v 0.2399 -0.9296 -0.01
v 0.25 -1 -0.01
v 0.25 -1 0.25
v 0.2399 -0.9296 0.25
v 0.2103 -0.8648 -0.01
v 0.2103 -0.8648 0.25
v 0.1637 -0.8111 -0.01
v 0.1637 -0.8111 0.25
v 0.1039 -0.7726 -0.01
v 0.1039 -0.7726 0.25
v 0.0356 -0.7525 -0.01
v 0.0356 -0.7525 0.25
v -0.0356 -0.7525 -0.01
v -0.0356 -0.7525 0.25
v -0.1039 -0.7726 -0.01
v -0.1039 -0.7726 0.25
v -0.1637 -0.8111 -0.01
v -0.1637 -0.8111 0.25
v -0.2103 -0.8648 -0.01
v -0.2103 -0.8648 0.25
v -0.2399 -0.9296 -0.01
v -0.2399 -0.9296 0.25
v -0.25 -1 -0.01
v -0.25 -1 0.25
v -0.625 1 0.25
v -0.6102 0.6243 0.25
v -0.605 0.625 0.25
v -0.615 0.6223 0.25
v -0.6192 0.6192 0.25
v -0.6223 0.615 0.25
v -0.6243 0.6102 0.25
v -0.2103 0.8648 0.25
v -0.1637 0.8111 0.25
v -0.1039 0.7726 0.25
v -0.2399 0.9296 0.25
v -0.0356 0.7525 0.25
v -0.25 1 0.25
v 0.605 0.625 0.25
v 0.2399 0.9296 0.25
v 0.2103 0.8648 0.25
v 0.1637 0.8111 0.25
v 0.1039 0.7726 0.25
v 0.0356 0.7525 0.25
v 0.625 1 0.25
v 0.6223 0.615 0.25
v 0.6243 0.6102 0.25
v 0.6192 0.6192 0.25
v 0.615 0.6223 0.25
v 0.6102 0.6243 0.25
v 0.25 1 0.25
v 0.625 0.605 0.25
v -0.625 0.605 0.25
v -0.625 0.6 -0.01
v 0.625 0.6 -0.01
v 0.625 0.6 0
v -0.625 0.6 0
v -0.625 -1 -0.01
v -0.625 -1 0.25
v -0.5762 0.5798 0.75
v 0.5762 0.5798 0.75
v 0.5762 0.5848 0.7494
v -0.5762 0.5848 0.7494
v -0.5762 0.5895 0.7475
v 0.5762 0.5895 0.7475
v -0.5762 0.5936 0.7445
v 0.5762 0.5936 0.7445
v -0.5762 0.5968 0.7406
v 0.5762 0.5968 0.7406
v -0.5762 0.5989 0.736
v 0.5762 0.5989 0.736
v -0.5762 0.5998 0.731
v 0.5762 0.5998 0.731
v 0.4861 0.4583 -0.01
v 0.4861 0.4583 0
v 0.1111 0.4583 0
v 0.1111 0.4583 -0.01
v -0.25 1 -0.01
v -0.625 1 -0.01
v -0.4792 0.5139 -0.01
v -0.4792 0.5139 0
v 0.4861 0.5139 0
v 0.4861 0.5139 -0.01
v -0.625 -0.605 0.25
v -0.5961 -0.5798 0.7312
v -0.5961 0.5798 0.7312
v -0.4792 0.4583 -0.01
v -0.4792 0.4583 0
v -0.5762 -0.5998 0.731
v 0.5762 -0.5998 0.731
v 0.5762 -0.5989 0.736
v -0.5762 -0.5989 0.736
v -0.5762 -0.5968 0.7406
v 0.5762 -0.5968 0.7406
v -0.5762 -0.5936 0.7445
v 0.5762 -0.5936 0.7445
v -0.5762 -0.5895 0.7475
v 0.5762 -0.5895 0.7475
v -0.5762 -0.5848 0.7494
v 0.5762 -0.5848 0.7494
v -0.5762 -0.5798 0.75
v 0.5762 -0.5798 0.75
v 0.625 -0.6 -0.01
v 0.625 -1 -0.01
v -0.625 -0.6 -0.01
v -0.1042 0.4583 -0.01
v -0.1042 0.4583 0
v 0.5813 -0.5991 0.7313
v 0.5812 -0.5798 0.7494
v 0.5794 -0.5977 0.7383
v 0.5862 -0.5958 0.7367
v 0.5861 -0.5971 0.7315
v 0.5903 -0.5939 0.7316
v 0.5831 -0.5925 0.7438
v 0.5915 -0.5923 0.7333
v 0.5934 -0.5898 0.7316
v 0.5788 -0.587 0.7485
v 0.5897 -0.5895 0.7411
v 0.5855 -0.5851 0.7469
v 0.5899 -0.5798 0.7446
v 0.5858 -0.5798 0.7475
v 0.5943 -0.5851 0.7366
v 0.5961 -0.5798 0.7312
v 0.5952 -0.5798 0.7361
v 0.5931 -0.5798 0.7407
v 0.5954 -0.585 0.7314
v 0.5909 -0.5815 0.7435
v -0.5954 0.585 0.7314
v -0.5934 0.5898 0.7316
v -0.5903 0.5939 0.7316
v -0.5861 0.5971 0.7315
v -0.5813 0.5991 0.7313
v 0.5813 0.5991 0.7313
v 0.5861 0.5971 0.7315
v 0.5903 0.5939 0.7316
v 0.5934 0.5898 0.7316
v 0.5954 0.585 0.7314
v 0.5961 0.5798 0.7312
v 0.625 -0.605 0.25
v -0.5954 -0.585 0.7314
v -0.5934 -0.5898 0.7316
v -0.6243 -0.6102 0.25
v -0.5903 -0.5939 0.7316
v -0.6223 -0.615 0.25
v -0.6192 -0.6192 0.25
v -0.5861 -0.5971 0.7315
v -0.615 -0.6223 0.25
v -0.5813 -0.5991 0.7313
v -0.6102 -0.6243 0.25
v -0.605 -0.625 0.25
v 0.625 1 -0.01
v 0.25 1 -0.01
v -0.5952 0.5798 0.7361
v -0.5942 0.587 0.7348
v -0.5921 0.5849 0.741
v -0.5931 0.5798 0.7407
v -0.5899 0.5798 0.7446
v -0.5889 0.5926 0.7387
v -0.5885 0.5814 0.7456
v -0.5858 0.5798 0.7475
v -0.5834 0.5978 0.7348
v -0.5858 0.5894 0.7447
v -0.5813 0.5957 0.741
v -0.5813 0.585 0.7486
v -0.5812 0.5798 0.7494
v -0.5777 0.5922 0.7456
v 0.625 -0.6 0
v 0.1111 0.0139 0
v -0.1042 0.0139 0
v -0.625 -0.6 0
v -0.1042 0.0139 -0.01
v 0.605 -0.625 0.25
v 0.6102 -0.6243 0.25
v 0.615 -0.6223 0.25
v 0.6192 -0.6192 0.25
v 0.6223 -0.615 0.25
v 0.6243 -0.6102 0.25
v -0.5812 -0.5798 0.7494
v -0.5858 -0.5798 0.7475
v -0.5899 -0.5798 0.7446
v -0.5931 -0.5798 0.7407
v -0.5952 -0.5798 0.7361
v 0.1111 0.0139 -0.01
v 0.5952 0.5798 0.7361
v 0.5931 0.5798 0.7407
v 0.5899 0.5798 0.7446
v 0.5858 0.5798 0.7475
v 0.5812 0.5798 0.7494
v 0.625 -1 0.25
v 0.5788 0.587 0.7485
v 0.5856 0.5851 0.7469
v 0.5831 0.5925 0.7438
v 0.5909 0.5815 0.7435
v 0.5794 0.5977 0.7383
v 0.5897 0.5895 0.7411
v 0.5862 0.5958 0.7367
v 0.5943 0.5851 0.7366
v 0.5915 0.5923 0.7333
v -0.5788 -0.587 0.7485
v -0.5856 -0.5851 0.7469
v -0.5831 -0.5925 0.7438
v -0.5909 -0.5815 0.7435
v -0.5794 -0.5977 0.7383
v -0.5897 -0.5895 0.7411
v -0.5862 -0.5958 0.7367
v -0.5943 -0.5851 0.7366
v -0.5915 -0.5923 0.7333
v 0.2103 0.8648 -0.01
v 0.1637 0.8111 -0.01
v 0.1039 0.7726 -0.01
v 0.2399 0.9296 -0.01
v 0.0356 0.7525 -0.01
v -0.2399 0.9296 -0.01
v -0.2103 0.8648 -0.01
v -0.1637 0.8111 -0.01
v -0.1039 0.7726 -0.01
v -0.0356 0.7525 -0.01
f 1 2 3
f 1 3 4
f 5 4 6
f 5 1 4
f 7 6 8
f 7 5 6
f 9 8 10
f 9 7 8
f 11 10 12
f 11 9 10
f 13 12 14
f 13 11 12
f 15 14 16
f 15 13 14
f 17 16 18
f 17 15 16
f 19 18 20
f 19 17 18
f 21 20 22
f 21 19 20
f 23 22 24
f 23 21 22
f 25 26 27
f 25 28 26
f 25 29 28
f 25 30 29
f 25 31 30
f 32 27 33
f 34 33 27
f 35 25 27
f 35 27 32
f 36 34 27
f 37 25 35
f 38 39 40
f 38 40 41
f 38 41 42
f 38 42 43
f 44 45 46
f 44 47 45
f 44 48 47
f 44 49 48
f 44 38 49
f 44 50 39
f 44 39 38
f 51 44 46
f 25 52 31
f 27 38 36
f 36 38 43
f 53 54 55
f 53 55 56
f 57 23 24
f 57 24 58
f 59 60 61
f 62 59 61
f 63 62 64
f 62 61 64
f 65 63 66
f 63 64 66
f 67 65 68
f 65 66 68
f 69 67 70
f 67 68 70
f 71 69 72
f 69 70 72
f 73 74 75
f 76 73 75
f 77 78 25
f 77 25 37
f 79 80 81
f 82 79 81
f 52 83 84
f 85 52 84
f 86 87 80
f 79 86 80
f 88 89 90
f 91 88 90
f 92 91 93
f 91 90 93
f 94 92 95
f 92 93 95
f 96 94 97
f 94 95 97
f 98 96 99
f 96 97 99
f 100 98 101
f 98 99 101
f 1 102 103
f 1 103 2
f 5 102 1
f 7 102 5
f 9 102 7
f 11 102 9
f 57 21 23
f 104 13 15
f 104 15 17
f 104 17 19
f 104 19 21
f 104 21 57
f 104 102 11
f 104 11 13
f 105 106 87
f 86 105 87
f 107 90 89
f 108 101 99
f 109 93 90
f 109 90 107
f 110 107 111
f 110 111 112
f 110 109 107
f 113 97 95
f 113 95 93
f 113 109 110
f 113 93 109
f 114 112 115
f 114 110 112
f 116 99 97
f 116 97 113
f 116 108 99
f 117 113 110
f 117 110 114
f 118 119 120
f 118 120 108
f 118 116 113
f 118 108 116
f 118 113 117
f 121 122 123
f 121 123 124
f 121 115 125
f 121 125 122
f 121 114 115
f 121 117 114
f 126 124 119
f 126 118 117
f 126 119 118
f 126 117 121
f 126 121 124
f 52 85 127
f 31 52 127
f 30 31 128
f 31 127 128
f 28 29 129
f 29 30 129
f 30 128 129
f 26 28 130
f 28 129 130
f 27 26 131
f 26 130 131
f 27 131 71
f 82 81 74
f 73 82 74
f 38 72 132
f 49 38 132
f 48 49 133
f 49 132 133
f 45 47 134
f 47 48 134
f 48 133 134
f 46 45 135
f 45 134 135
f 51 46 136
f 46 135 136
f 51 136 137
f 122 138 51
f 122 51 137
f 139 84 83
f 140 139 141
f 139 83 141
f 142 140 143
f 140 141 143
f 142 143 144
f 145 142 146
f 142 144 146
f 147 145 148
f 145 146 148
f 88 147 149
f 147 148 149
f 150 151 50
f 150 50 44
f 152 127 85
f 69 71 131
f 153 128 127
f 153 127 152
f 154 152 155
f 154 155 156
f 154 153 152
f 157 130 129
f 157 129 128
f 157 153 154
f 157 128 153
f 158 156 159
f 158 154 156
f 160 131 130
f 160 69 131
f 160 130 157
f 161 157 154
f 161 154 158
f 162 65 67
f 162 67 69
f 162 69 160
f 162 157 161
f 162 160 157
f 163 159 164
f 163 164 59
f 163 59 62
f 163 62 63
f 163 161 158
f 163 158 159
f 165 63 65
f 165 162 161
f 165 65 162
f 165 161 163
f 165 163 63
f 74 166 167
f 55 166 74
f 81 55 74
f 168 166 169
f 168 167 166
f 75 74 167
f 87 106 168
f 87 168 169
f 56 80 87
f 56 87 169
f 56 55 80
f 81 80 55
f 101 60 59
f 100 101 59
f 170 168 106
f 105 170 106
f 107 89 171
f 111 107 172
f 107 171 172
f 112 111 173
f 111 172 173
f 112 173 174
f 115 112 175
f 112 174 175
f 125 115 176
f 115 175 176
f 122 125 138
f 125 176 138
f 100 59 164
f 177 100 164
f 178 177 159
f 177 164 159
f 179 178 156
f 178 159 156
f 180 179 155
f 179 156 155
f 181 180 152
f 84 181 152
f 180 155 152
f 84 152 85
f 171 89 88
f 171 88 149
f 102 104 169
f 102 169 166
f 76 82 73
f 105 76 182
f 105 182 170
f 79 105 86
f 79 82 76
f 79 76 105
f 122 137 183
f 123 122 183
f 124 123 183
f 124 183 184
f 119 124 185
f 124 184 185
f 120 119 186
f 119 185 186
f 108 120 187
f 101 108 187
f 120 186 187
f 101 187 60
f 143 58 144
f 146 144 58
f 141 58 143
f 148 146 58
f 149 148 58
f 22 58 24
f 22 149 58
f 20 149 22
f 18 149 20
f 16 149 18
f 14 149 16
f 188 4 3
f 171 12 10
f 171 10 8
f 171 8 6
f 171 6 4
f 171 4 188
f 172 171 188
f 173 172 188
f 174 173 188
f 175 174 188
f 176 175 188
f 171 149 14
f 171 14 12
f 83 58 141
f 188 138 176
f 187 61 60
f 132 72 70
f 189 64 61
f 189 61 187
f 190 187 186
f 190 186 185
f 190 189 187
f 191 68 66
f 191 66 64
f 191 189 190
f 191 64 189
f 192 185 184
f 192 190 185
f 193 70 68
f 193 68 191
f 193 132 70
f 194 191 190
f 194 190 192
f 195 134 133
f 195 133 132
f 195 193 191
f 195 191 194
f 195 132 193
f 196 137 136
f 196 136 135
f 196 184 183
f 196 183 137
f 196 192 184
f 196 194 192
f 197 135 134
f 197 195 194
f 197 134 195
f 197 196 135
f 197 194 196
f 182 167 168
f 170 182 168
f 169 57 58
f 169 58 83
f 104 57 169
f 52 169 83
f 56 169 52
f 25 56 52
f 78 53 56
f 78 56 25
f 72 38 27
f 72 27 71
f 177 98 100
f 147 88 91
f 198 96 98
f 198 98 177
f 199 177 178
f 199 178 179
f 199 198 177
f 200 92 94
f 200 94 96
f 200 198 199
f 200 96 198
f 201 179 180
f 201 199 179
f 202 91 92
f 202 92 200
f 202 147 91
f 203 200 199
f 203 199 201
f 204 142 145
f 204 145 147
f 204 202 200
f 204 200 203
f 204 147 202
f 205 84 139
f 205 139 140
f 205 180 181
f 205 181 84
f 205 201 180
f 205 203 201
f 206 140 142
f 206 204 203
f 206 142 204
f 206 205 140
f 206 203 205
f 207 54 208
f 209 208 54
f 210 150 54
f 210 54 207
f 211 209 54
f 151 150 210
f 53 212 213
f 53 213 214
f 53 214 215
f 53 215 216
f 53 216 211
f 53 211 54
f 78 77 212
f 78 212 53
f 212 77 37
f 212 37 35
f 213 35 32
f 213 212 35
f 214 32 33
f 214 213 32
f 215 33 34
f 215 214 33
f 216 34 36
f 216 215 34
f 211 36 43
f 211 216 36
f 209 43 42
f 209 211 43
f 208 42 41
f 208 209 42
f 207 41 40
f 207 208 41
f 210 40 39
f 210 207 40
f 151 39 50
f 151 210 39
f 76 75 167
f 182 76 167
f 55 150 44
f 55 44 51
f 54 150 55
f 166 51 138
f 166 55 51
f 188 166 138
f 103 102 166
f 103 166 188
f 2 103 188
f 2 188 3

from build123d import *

# Parameters (mm, degrees)
EXTRUDE_1_DEPTH     = 0.75
CUT_EXTRUDE_1_REACH = 3.768
SKETCH_2_W          = 0.5
SKETCH_2_H          = 0.375
EXTRUDE_START       = 0.01
EXTRUDE_2_DEPTH     = 0.01
WRAP_1_DEPTH        = 0.01
CUT_EXTRUDE_2_REACH = 3.896
CHAMFER_1_SIZE      = 0.5
CHAMFER_1_SIZE_2    = 0.02620389
CHAMFER_2_SIZE      = 0.02620389
CHAMFER_2_SIZE_2    = 0.5
FILLET_1_R          = 0.02


with BuildPart() as part:
    # 草图1 → 凸台-拉伸1 (new body)
    with BuildSketch(Plane.XY):
        with BuildLine():
            Line((-0.625, 1), (-0.25, 1))
            ThreePointArc((-0.25, 1), (0, 0.75), (0.25, 1))
            Line((0.25, 1), (0.625, 1))
            Line((0.625, 1), (0.625, -1))
            Line((0.625, -1), (0.25, -1))
            ThreePointArc((0.25, -1), (0, -0.75), (-0.25, -1))
            Line((-0.25, -1), (-0.625, -1))
            Line((-0.625, -1), (-0.625, 1))
        make_face()
    extrude(amount=EXTRUDE_1_DEPTH)

    # 草图2 → 切除-拉伸1 (cut, up to next)
    with BuildSketch(Plane(origin=(0.625, 0, 0), x_dir=(0, 0, -1), z_dir=(1, 0, 0)), mode=Mode.PRIVATE) as cut_extrude_1_sk1:
        with Locations((-0.5, 0.8125)):
            Rectangle(SKETCH_2_W, SKETCH_2_H)
    cut_extrude_1_tool1 = extrude(cut_extrude_1_sk1.sketch, amount=-CUT_EXTRUDE_1_REACH, mode=Mode.PRIVATE) & part.part
    # 草图2 → 切除-拉伸1 (cut, up to next)
    with BuildSketch(Plane(origin=(0.625, 0, 0), x_dir=(0, 0, -1), z_dir=(1, 0, 0)), mode=Mode.PRIVATE) as cut_extrude_1_sk2:
        with Locations((-0.5, -0.8125)):
            Rectangle(SKETCH_2_W, SKETCH_2_H)
    cut_extrude_1_tool2 = extrude(cut_extrude_1_sk2.sketch, amount=-CUT_EXTRUDE_1_REACH, mode=Mode.PRIVATE) & part.part
    add(cut_extrude_1_tool1.solids().sort_by_distance((0.625, 0.8125, 0.5))[0], mode=Mode.SUBTRACT)
    add(cut_extrude_1_tool2.solids().sort_by_distance((0.625, -0.8125, 0.5))[0], mode=Mode.SUBTRACT)

    # 草图3 → 凸台-拉伸2 (add)
    with BuildSketch(Plane(origin=(0, 0, 0), x_dir=(-1, 0, 0), z_dir=(0, 0, -1)).offset(EXTRUDE_START)):
        with BuildLine():
            Line((-0.625, 1), (-0.625, 0.6))
            Line((-0.625, 0.6), (0.625, 0.6))
            Line((0.625, 0.6), (0.625, 1))
            Line((0.625, 1), (0.25, 1))
            ThreePointArc((0.25, 1), (0, 0.75), (-0.25, 1))
            Line((-0.25, 1), (-0.625, 1))
        make_face()
        with BuildLine():
            Line((0.625, -0.6), (-0.625, -0.6))
            Line((-0.625, -0.6), (-0.625, -1))
            Line((-0.625, -1), (-0.25, -1))
            ThreePointArc((-0.25, -1), (0, -0.75), (0.25, -1))
            Line((0.25, -1), (0.625, -1))
            Line((0.625, -1), (0.625, -0.6))
        make_face()
    extrude(amount=-EXTRUDE_2_DEPTH)

    # 包覆1: read off the stored shape, not the designer's step
    # 包覆1 outline → 包覆1 (add)
    with BuildSketch(Plane(origin=(0, 0, 0), x_dir=(-1, 0, 0), z_dir=(0, 0, -1))):
        Polygon((0.104166667, 0.013888889), (0.104166667, 0.458333333), (0.479166667, 0.458333333), (0.479166667, 0.513888889), (-0.486111111, 0.513888889), (-0.486111111, 0.458333333), (-0.111111111, 0.458333333), (-0.111111111, 0.013888889), align=None)
    extrude(amount=WRAP_1_DEPTH)

    # 草图7 → 切除-拉伸2 (cut, up to next)
    with BuildSketch(Plane(origin=(0, 0.625, 0), x_dir=(1, 0, 0), z_dir=(0, 1, 0)), mode=Mode.PRIVATE) as cut_extrude_2_sk1:
        Polygon((-0.625, -0.25), (-0.595016124, -0.75), (-0.625, -0.75), align=None)
    cut_extrude_2_tool1 = extrude(cut_extrude_2_sk1.sketch, amount=-CUT_EXTRUDE_2_REACH, mode=Mode.PRIVATE) & part.part
    # 草图7 → 切除-拉伸2 (cut, up to next)
    with BuildSketch(Plane(origin=(0, 0.625, 0), x_dir=(1, 0, 0), z_dir=(0, 1, 0)), mode=Mode.PRIVATE) as cut_extrude_2_sk2:
        Polygon((0.595016124, -0.75), (0.625, -0.75), (0.625, -0.25), align=None)
    cut_extrude_2_tool2 = extrude(cut_extrude_2_sk2.sketch, amount=-CUT_EXTRUDE_2_REACH, mode=Mode.PRIVATE) & part.part
    add(cut_extrude_2_tool1.solids().sort_by_distance((-0.615005, 0.625, 0.583333))[0], mode=Mode.SUBTRACT)
    add(cut_extrude_2_tool2.solids().sort_by_distance((0.615005, 0.625, 0.583333))[0], mode=Mode.SUBTRACT)

    # 倒角1
    # the kernel refuses this chamfer: 0.5, 0.02620389 mm, written as the material it takes off along each edge
    with BuildSketch(Plane(origin=(1.894950234, 0.625, 0.75), x_dir=(0, 0, -1), z_dir=(-1, 0, 0))) as chamfer_1_piece_1_section:
        Polygon((CHAMFER_1_SIZE, 0), (0, CHAMFER_1_SIZE_2 * 0.99999998632), (0, 0), align=None)
    chamfer_1_piece_1 = extrude(amount=3.789900469, mode=Mode.PRIVATE)
    chamfer_1_piece_1 = split(chamfer_1_piece_1, bisect_by=Plane(origin=(1.894950234, 0.625, 0.25), z_dir=(0, 0, 1)), keep=Keep.TOP, mode=Mode.PRIVATE)
    add(chamfer_1_piece_1, mode=Mode.SUBTRACT)

    # 倒角2
    # the kernel refuses this chamfer: 0.5, 0.02620389 mm, written as the material it takes off along each edge
    with BuildSketch(Plane(origin=(1.894950234, -0.625, 0.75), x_dir=(0, 1, 0), z_dir=(-1, 0, 0))) as chamfer_2_piece_1_section:
        Polygon((CHAMFER_2_SIZE * 0.99999998632, 0), (0, CHAMFER_2_SIZE_2), (0, 0), align=None)
    chamfer_2_piece_1 = extrude(amount=3.789900469, mode=Mode.PRIVATE)
    chamfer_2_piece_1 = split(chamfer_2_piece_1, bisect_by=Plane(origin=(1.894950234, -0.625, 0.25), z_dir=(0, 0, 1)), keep=Keep.TOP, mode=Mode.PRIVATE)
    add(chamfer_2_piece_1, mode=Mode.SUBTRACT)

    # 圆角1
    # the kernel refuses this fillet: 0.02 mm, written as the material it takes off along each edge
    with BuildSketch(Plane(origin=(0.57617955, 0.579816819, 0.73), x_dir=(0.04124395278448508, 0.7247571544349799, -0.6877688590318859), z_dir=(0.5553605365793874, 0.5555957455592435, 0.618779477622459))) as fillet_1_piece_1_section:
        Polygon((-0.040070478, -0.040070478), (0.040070478, -0.040070478), (0.040070478, 0.040070478), (-0.040070478, 0.040070478), align=None)
    fillet_1_piece_1 = extrude(amount=0.040070478, mode=Mode.PRIVATE)
    fillet_1_piece_1 = split(fillet_1_piece_1, bisect_by=Plane(origin=(0.57617955, 0.579816819, 0.73), z_dir=(0, 1, 0)), keep=Keep.TOP, mode=Mode.PRIVATE)
    fillet_1_piece_1 = split(fillet_1_piece_1, bisect_by=Plane(origin=(0.57617955, 0.579816819, 0.73), z_dir=(1, 0, 0)), keep=Keep.TOP, mode=Mode.PRIVATE)
    fillet_1_piece_1 = split(fillet_1_piece_1, bisect_by=Plane(origin=(0.57617955, 0.579816819, 0.73), z_dir=(-0.05977847359904646, -0.052242362176689705, 0.9968436535828312)), keep=Keep.TOP, mode=Mode.PRIVATE)
    fillet_1_piece_1 = split(fillet_1_piece_1, bisect_by=Plane(origin=(0.596143685, 0.579816819, 0.731197204), z_dir=(-0.9982067693968444, 0, -0.0598602165909465)), keep=Keep.TOP, mode=Mode.PRIVATE)
    fillet_1_piece_1 = split(fillet_1_piece_1, bisect_by=Plane(origin=(0.57617955, 0.579816819, 0.75), z_dir=(0, 0, -1)), keep=Keep.TOP, mode=Mode.PRIVATE)
    fillet_1_piece_1 = split(fillet_1_piece_1, bisect_by=Plane(origin=(0.57617955, 0.59978941, 0.731046719), z_dir=(0, -0.9986295347545728, -0.05233595624296412)), keep=Keep.TOP, mode=Mode.PRIVATE)
    fillet_1_piece_1 = fillet_1_piece_1 - Plane(origin=(0.57617955, 0.579816819, 0.73), x_dir=(-0.5553605365793874, -0.5555957455592435, -0.618779477622459), z_dir=(0.04124395278448508, 0.7247571544349799, -0.6877688590318859)) * Sphere(FILLET_1_R, mode=Mode.PRIVATE)
    add(fillet_1_piece_1, mode=Mode.SUBTRACT)
    with BuildSketch(Plane(origin=(-0.57617955, 0.579816819, 0.73), x_dir=(0.7072564722746582, 0.7069570584028463, 0), z_dir=(-0.5553605365793893, 0.5555957455592451, 0.6187794776224558))) as fillet_1_piece_2_section:
        Polygon((-0.040070478, -0.040070478), (0.040070478, -0.040070478), (0.040070478, 0.040070478), (-0.040070478, 0.040070478), align=None)
    fillet_1_piece_2 = extrude(amount=0.040070478, mode=Mode.PRIVATE)
    fillet_1_piece_2 = split(fillet_1_piece_2, bisect_by=Plane(origin=(-0.57617955, 0.579816819, 0.73), z_dir=(-1, 0, 0)), keep=Keep.TOP, mode=Mode.PRIVATE)
    fillet_1_piece_2 = split(fillet_1_piece_2, bisect_by=Plane(origin=(-0.57617955, 0.579816819, 0.73), z_dir=(0.0597784735990376, -0.05224236217668974, 0.9968436535828318)), keep=Keep.TOP, mode=Mode.PRIVATE)
    fillet_1_piece_2 = split(fillet_1_piece_2, bisect_by=Plane(origin=(-0.57617955, 0.579816819, 0.73), z_dir=(0, 1, 0)), keep=Keep.TOP, mode=Mode.PRIVATE)
    fillet_1_piece_2 = split(fillet_1_piece_2, bisect_by=Plane(origin=(-0.57617955, 0.579816819, 0.75), z_dir=(0, 0, -1)), keep=Keep.TOP, mode=Mode.PRIVATE)
    fillet_1_piece_2 = split(fillet_1_piece_2, bisect_by=Plane(origin=(-0.57617955, 0.59978941, 0.731046719), z_dir=(0, -0.9986295347545728, -0.05233595624296412)), keep=Keep.TOP, mode=Mode.PRIVATE)
    fillet_1_piece_2 = split(fillet_1_piece_2, bisect_by=Plane(origin=(-0.596143685, 0.579816819, 0.731197204), z_dir=(0.998206769396845, 0, -0.05986021659093763)), keep=Keep.TOP, mode=Mode.PRIVATE)
    fillet_1_piece_2 = fillet_1_piece_2 - Plane(origin=(-0.57617955, 0.579816819, 0.73), x_dir=(0.5553605365793893, -0.5555957455592451, -0.6187794776224558), z_dir=(0.7072564722746582, 0.7069570584028463, 0)) * Sphere(FILLET_1_R, mode=Mode.PRIVATE)
    add(fillet_1_piece_2, mode=Mode.SUBTRACT)
    with BuildSketch(Plane(origin=(0.57617955, -0.579816819, 0.73), x_dir=(-0.04124395278448508, 0.7247571544349799, 0.6877688590318859), z_dir=(0.5553605365793874, -0.5555957455592435, 0.618779477622459))) as fillet_1_piece_3_section:
        Polygon((-0.040070478, -0.040070478), (0.040070478, -0.040070478), (0.040070478, 0.040070478), (-0.040070478, 0.040070478), align=None)
    fillet_1_piece_3 = extrude(amount=0.040070478, mode=Mode.PRIVATE)
    fillet_1_piece_3 = split(fillet_1_piece_3, bisect_by=Plane(origin=(0.57617955, -0.579816819, 0.73), z_dir=(0, -1, 0)), keep=Keep.TOP, mode=Mode.PRIVATE)
    fillet_1_piece_3 = split(fillet_1_piece_3, bisect_by=Plane(origin=(0.57617955, -0.579816819, 0.73), z_dir=(1, 0, 0)), keep=Keep.TOP, mode=Mode.PRIVATE)
    fillet_1_piece_3 = split(fillet_1_piece_3, bisect_by=Plane(origin=(0.57617955, -0.579816819, 0.73), z_dir=(-0.05977847359904646, 0.052242362176689705, 0.9968436535828312)), keep=Keep.TOP, mode=Mode.PRIVATE)
    fillet_1_piece_3 = split(fillet_1_piece_3, bisect_by=Plane(origin=(0.596143685, -0.579816819, 0.731197204), z_dir=(-0.9982067693968444, 0, -0.0598602165909465)), keep=Keep.TOP, mode=Mode.PRIVATE)
    fillet_1_piece_3 = split(fillet_1_piece_3, bisect_by=Plane(origin=(0.57617955, -0.579816819, 0.75), z_dir=(0, 0, -1)), keep=Keep.TOP, mode=Mode.PRIVATE)
    fillet_1_piece_3 = split(fillet_1_piece_3, bisect_by=Plane(origin=(0.57617955, -0.59978941, 0.731046719), z_dir=(0, 0.9986295347545728, -0.05233595624296412)), keep=Keep.TOP, mode=Mode.PRIVATE)
    fillet_1_piece_3 = fillet_1_piece_3 - Plane(origin=(0.57617955, -0.579816819, 0.73), x_dir=(-0.5553605365793874, 0.5555957455592435, -0.618779477622459), z_dir=(-0.04124395278448508, 0.7247571544349799, 0.6877688590318859)) * Sphere(FILLET_1_R, mode=Mode.PRIVATE)
    add(fillet_1_piece_3, mode=Mode.SUBTRACT)
    with BuildSketch(Plane(origin=(-0.57617955, -0.579816819, 0.73), x_dir=(-0.041243952784478954, -0.72475715443498, -0.687768859031886), z_dir=(-0.5553605365793893, -0.5555957455592451, 0.6187794776224558))) as fillet_1_piece_4_section:
        Polygon((-0.040070478, -0.040070478), (0.040070478, -0.040070478), (0.040070478, 0.040070478), (-0.040070478, 0.040070478), align=None)
    fillet_1_piece_4 = extrude(amount=0.040070478, mode=Mode.PRIVATE)
    fillet_1_piece_4 = split(fillet_1_piece_4, bisect_by=Plane(origin=(-0.57617955, -0.579816819, 0.73), z_dir=(0.0597784735990376, 0.05224236217668974, 0.9968436535828318)), keep=Keep.TOP, mode=Mode.PRIVATE)
    fillet_1_piece_4 = split(fillet_1_piece_4, bisect_by=Plane(origin=(-0.57617955, -0.579816819, 0.73), z_dir=(-1, 0, 0)), keep=Keep.TOP, mode=Mode.PRIVATE)
    fillet_1_piece_4 = split(fillet_1_piece_4, bisect_by=Plane(origin=(-0.57617955, -0.579816819, 0.73), z_dir=(0, -1, 0)), keep=Keep.TOP, mode=Mode.PRIVATE)
    fillet_1_piece_4 = split(fillet_1_piece_4, bisect_by=Plane(origin=(-0.596143685, -0.579816819, 0.731197204), z_dir=(0.998206769396845, 0, -0.05986021659093763)), keep=Keep.TOP, mode=Mode.PRIVATE)
    fillet_1_piece_4 = split(fillet_1_piece_4, bisect_by=Plane(origin=(-0.57617955, -0.59978941, 0.731046719), z_dir=(0, 0.9986295347545728, -0.05233595624296412)), keep=Keep.TOP, mode=Mode.PRIVATE)
    fillet_1_piece_4 = split(fillet_1_piece_4, bisect_by=Plane(origin=(-0.57617955, -0.579816819, 0.75), z_dir=(0, 0, -1)), keep=Keep.TOP, mode=Mode.PRIVATE)
    fillet_1_piece_4 = fillet_1_piece_4 - Plane(origin=(-0.57617955, -0.579816819, 0.73), x_dir=(0.5553605365793893, 0.5555957455592451, -0.6187794776224558), z_dir=(-0.041243952784478954, -0.72475715443498, -0.687768859031886)) * Sphere(FILLET_1_R, mode=Mode.PRIVATE)
    add(fillet_1_piece_4, mode=Mode.SUBTRACT)
    with BuildSketch(Plane(origin=(0.596081336, 0.599727034, 0.732236916), x_dir=(-0.9982116679813796, 0.0031285635785502862, -0.059696549278554306), z_dir=(0.059778473599046464, 0.05224236217668971, -0.9968436535828313))) as fillet_1_piece_5_section:
        with BuildLine():
            CenterArc((FILLET_1_R * 0.996872050334, -FILLET_1_R), FILLET_1_R, 90, 89.8205011)
            Line((-FILLET_1_R * 0.00312304230512, -FILLET_1_R * 0.996867158324), (0, 0))
            Line((0, 0), (FILLET_1_R * 0.996872050334, 0))
        make_face()
    fillet_1_piece_5 = extrude(amount=0.533607444, mode=Mode.PRIVATE)
    fillet_1_piece_5 = split(fillet_1_piece_5, bisect_by=Plane(origin=(0.596081336, 0.599727034, 0.25), z_dir=(0, 0, 1)), keep=Keep.TOP, mode=Mode.PRIVATE)
    add(fillet_1_piece_5, mode=Mode.SUBTRACT)
    with BuildSketch(Plane(origin=(0.57617955, 0.59879611, 0.75), x_dir=(0, 0.05233595624296042, -0.9986295347545731), z_dir=(-1, 0, 0)), Plane(origin=(0.57617955, -0.59879611, 0.75), x_dir=(0, 1, 0), z_dir=(-1, 0, 0))) as fillet_1_piece_6:
        with BuildLine():
            CenterArc((FILLET_1_R * 0.948964566715, FILLET_1_R), FILLET_1_R, 183, 87)
            Line((-FILLET_1_R * 0.0496649680397, FILLET_1_R * 0.947664043757), (0, 0))
            Line((0, 0), (FILLET_1_R * 0.948964566715, 0))
        make_face()
    extrude(amount=1.152359099, mode=Mode.SUBTRACT)
    with BuildSketch(Plane(origin=(-0.596081336, 0.599727034, 0.732236916), x_dir=(-0.003127239115103472, -0.9986344354137802, -0.052148679574054314), z_dir=(-0.0597784735990376, 0.05224236217668974, -0.9968436535828318))) as fillet_1_piece_7_section:
        with BuildLine():
            CenterArc((FILLET_1_R * 0.996872050334, -FILLET_1_R), FILLET_1_R, 90, 89.8205011)
            Line((-FILLET_1_R * 0.00312304230511, -FILLET_1_R * 0.996867158324), (0, 0))
            Line((0, 0), (FILLET_1_R * 0.996872050334, 0))
        make_face()
    fillet_1_piece_7 = extrude(amount=0.533607444, mode=Mode.PRIVATE)
    fillet_1_piece_7 = split(fillet_1_piece_7, bisect_by=Plane(origin=(-0.596081336, 0.599727034, 0.25), z_dir=(0, 0, 1)), keep=Keep.TOP, mode=Mode.PRIVATE)
    add(fillet_1_piece_7, mode=Mode.SUBTRACT)
    with BuildSketch(Plane(origin=(0.595016124, 0.579816819, 0.75), x_dir=(0.05986021659094882, 0, -0.9982067693968444), z_dir=(0, -1, 0))) as fillet_1_piece_8:
        with BuildLine():
            CenterArc((FILLET_1_R * 0.941828699456, -FILLET_1_R), FILLET_1_R, 90, 86.568210653)
            Line((-FILLET_1_R * 0.056378069941, -FILLET_1_R * 0.940139783409), (0, 0))
            Line((0, 0), (FILLET_1_R * 0.941828699456, 0))
        make_face()
    extrude(amount=1.159633638, mode=Mode.SUBTRACT)
    with BuildSketch(Plane(origin=(-0.595016124, 0.579816819, 0.75), x_dir=(-0.05986021659093708, 0, -0.998206769396845), z_dir=(0, -1, 0))) as fillet_1_piece_9:
        with BuildLine():
            CenterArc((FILLET_1_R * 0.941828699456, FILLET_1_R), FILLET_1_R, 183.431789347, 86.568210653)
            Line((-FILLET_1_R * 0.056378069941, FILLET_1_R * 0.940139783409), (0, 0))
            Line((0, 0), (FILLET_1_R * 0.941828699456, 0))
        make_face()
    extrude(amount=1.159633638, mode=Mode.SUBTRACT)
    with BuildSketch(Plane(origin=(0.627979574, -0.627603948, 0.200313721), x_dir=(0.003127239115114234, 0.9986344354137802, -0.05214867957405363), z_dir=(-0.059778473599046464, 0.05224236217668971, 0.9968436535828313))) as fillet_1_piece_10_section:
        with BuildLine():
            CenterArc((FILLET_1_R * 0.996872050334, FILLET_1_R), FILLET_1_R, 180.1794989, 89.8205011)
            Line((-FILLET_1_R * 0.00312304230511, FILLET_1_R * 0.996867158324), (0, 0))
            Line((0, 0), (FILLET_1_R * 0.996872050334, 0))
        make_face()
    fillet_1_piece_10 = extrude(amount=0.533607444, mode=Mode.PRIVATE)
    fillet_1_piece_10 = split(fillet_1_piece_10, bisect_by=Plane(origin=(0.627979574, -0.627603948, 0.25), z_dir=(0, 0, 1)), keep=Keep.TOP, mode=Mode.PRIVATE)
    add(fillet_1_piece_10, mode=Mode.SUBTRACT)
    with BuildSketch(Plane(origin=(-0.627979574, -0.627603948, 0.200313721), x_dir=(-0.0031272391150979234, 0.9986344354137803, -0.052148679574054654), z_dir=(0.0597784735990376, 0.05224236217668974, 0.9968436535828318))) as fillet_1_piece_11_section:
        with BuildLine():
            CenterArc((FILLET_1_R * 0.996872050334, -FILLET_1_R), FILLET_1_R, 90, 89.8205011)
            Line((-FILLET_1_R * 0.0031230423051, -FILLET_1_R * 0.996867158324), (0, 0))
            Line((0, 0), (FILLET_1_R * 0.996872050334, 0))
        make_face()
    fillet_1_piece_11 = extrude(amount=0.533607444, mode=Mode.PRIVATE)
    fillet_1_piece_11 = split(fillet_1_piece_11, bisect_by=Plane(origin=(-0.627979574, -0.627603948, 0.25), z_dir=(0, 0, 1)), keep=Keep.TOP, mode=Mode.PRIVATE)
    add(fillet_1_piece_11, mode=Mode.SUBTRACT)


solid = part.part
